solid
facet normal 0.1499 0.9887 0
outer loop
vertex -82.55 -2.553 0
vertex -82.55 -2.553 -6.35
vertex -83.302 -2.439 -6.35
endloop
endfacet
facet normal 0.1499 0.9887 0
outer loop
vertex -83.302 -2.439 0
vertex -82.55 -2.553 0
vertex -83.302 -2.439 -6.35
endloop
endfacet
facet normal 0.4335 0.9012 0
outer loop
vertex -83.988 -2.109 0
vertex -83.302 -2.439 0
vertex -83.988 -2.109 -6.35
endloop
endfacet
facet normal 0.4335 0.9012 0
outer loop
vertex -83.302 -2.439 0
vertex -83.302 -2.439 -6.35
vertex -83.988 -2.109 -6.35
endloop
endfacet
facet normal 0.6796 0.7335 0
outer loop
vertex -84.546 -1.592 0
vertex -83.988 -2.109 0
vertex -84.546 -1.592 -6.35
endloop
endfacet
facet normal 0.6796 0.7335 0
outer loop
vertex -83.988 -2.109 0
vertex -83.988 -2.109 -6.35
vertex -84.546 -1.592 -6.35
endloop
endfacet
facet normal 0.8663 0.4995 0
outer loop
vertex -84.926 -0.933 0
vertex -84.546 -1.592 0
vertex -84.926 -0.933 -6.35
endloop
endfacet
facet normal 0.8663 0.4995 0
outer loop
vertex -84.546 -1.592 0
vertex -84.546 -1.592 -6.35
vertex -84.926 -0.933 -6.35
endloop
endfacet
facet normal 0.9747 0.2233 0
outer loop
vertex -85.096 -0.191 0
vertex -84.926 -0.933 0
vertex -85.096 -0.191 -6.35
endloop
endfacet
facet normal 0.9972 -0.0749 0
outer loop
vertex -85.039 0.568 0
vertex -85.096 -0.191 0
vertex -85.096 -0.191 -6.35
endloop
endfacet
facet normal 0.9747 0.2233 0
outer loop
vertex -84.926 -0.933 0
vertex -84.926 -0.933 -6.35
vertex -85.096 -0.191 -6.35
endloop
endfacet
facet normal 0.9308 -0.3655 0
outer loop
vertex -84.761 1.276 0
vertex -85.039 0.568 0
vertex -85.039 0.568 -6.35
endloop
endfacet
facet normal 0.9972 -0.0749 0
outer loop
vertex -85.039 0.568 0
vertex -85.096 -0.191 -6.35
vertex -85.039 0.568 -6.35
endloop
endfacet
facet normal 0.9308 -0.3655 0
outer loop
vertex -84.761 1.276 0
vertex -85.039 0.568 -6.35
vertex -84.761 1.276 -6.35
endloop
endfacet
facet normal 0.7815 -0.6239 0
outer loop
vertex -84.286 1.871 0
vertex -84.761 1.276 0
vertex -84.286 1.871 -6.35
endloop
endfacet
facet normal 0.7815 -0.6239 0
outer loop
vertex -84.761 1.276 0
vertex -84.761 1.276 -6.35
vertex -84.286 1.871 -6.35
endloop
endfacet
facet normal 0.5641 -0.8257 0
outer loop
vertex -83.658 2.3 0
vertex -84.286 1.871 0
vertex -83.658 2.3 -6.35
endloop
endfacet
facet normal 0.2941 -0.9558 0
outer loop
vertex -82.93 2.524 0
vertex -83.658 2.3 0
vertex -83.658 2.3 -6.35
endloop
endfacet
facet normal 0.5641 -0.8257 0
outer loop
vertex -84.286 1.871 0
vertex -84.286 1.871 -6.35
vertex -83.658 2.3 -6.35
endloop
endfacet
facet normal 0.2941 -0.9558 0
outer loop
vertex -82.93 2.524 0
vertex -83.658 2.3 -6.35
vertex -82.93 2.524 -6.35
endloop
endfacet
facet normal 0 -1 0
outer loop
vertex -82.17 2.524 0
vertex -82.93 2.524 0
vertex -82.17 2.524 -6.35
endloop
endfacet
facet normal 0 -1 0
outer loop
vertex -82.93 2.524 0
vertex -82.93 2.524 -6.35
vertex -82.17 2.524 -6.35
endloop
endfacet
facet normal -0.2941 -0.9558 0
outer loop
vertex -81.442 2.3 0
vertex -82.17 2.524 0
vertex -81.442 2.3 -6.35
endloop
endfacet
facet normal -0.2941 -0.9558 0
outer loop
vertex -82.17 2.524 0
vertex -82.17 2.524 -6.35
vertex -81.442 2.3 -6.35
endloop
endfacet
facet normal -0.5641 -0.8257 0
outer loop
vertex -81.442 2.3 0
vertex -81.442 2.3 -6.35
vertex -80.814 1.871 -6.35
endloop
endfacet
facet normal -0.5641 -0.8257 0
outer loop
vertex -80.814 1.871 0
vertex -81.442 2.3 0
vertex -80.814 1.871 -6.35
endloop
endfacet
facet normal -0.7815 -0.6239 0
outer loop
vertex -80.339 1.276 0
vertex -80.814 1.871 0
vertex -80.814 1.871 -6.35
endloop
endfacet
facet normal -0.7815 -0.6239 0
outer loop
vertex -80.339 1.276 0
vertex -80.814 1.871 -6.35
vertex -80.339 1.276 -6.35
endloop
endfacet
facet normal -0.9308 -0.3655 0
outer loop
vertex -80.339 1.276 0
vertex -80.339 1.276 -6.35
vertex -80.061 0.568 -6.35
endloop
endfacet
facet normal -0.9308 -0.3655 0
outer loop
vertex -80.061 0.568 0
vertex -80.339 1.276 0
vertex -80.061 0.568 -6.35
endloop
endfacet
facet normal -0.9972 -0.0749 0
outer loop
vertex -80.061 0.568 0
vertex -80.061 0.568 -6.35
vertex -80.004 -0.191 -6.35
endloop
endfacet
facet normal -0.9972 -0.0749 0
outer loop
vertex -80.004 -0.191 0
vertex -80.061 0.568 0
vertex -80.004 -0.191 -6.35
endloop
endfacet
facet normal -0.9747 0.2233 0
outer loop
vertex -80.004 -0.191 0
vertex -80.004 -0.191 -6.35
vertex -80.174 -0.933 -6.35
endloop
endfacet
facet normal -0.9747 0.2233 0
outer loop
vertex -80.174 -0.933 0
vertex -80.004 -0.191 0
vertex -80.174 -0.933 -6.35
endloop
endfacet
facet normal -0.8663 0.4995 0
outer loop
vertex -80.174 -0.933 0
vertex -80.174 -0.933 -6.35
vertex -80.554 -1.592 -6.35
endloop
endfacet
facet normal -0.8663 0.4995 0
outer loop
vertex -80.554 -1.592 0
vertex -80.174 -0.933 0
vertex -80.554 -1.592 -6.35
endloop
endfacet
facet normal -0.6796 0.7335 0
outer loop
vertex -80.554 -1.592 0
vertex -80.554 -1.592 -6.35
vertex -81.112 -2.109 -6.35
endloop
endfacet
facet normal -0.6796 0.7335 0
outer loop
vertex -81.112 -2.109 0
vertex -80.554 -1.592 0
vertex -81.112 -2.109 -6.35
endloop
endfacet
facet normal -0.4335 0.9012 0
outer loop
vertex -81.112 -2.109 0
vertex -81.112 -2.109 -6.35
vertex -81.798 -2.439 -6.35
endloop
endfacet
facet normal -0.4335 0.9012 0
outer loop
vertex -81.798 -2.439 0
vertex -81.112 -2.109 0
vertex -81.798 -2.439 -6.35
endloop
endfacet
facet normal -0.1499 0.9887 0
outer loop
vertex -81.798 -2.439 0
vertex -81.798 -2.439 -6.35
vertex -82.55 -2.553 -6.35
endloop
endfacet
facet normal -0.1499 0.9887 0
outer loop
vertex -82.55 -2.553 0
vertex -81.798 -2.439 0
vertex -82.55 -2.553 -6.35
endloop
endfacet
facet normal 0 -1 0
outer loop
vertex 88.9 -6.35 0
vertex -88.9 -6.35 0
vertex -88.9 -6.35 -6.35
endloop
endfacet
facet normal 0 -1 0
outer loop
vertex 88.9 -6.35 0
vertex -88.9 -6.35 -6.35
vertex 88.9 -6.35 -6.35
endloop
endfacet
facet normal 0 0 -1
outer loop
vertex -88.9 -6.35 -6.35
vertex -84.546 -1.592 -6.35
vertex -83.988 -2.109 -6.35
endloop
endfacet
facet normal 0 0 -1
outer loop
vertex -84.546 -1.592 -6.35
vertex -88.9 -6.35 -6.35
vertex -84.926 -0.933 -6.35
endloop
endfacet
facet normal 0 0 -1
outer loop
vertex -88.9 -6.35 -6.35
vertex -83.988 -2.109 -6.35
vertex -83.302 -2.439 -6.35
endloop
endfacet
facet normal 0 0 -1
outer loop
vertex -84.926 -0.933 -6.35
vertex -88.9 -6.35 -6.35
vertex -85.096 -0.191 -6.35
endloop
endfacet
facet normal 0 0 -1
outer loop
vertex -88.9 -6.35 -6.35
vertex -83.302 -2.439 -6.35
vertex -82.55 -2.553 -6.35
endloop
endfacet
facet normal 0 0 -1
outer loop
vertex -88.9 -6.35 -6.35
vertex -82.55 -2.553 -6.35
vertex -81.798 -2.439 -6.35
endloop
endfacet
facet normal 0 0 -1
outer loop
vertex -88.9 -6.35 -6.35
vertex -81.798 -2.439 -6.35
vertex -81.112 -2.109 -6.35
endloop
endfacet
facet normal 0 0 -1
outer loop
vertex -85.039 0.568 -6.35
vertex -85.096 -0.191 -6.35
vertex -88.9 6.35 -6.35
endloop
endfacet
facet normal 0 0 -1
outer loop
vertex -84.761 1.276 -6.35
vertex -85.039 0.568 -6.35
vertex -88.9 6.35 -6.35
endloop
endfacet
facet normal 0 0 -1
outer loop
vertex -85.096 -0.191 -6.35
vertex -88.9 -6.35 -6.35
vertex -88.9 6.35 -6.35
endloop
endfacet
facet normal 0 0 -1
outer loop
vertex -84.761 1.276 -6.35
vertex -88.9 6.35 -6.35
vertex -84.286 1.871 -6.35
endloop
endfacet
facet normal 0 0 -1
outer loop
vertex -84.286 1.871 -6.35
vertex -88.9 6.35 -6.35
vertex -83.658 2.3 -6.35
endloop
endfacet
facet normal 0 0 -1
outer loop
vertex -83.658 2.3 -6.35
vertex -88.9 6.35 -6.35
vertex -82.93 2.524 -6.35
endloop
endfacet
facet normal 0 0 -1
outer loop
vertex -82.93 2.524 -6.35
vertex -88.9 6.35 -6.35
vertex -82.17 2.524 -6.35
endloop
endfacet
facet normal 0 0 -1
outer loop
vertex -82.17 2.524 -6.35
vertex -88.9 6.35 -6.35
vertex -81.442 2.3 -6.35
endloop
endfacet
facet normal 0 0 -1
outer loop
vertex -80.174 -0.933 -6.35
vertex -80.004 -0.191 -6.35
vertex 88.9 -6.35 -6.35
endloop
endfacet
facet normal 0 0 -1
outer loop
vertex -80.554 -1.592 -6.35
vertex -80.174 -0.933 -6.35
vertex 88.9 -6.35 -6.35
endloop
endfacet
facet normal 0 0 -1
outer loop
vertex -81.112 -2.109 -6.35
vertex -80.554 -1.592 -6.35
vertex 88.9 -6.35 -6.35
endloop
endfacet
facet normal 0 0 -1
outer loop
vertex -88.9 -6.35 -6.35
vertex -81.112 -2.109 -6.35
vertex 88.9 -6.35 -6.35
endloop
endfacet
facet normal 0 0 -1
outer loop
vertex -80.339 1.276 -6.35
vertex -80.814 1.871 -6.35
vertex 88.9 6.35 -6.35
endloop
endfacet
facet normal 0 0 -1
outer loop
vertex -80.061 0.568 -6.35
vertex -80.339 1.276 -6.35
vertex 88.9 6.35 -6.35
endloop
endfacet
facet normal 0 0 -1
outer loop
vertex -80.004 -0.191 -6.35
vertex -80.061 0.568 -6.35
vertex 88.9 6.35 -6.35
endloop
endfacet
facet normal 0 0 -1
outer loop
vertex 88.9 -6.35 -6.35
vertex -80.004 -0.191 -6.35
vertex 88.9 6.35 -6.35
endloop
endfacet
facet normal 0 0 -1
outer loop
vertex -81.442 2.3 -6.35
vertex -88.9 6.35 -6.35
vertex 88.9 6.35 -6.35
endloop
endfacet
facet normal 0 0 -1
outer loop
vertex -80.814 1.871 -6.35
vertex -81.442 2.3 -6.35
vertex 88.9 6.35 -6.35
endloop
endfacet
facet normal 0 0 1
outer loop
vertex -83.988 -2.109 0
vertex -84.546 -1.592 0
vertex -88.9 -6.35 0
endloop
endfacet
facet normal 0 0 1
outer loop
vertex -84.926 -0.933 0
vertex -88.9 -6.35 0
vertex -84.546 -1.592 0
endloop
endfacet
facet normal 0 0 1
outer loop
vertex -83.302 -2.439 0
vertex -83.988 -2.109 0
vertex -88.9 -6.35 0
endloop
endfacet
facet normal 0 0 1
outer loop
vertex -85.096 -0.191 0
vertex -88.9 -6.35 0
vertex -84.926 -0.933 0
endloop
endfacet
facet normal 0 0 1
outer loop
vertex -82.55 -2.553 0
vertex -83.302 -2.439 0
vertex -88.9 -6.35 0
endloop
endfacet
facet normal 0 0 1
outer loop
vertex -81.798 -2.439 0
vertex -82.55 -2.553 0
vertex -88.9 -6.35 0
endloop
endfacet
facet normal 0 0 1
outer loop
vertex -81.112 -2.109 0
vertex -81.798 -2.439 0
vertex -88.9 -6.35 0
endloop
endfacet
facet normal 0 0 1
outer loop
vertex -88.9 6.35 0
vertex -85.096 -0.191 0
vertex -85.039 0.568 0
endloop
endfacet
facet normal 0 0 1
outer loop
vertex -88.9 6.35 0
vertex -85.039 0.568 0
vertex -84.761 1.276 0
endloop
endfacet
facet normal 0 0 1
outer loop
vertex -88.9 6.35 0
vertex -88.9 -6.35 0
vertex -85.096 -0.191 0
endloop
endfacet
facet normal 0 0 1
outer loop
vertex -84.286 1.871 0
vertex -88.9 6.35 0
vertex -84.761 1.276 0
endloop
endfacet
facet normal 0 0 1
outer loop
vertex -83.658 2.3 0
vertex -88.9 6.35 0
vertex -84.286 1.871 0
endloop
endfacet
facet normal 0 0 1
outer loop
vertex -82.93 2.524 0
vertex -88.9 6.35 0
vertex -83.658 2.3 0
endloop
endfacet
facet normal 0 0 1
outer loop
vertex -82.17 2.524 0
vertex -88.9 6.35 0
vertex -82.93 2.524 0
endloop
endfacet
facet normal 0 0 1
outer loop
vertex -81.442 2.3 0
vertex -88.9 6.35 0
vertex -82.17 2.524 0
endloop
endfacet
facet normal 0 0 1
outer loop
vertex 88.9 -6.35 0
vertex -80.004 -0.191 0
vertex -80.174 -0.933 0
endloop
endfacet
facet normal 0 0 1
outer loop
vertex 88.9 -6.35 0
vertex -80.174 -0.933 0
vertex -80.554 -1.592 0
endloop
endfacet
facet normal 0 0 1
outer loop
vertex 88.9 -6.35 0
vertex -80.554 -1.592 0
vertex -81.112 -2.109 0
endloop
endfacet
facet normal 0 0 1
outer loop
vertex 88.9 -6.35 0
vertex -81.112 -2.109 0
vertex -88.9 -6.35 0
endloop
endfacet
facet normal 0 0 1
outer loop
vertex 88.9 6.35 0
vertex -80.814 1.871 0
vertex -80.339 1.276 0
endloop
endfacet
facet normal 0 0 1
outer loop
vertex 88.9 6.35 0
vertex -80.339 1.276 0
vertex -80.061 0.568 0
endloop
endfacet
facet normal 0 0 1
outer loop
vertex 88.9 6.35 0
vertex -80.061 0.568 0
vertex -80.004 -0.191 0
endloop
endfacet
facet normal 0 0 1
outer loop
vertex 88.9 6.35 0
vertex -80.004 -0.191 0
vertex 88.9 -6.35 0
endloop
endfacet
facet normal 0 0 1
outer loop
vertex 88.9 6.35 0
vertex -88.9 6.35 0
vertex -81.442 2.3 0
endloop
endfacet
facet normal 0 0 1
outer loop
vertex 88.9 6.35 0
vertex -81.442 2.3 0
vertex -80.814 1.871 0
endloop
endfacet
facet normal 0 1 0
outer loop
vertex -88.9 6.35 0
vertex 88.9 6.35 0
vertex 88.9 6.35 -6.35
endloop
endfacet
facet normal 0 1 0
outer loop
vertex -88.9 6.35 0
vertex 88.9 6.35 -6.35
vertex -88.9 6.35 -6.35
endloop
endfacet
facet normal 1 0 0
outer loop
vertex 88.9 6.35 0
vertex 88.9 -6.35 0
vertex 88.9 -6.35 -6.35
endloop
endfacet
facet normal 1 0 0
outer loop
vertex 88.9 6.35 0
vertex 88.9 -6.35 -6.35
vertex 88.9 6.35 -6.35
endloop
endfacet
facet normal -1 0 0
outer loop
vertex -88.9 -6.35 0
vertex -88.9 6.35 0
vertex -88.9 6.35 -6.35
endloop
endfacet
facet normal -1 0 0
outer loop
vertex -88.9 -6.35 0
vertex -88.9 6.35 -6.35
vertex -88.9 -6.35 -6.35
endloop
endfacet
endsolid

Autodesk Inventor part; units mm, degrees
ref_plane "YZ Plane" through (0, 0, 0) normal (1, 0, 0) x (0, 1, 0)
ref_plane "XZ Plane" through (0, 0, 0) normal (0, 1, 0) x (-1, 0, 0)
ref_plane "XY Plane" through (0, 0, 0) normal (0, 0, 1) x (1, 0, 0)
sketch "Sketch1" plane through (0, 0, 0) normal (0, 0, 1) x (1, 0, 0)
  line L0 (-88.9, -6.35) -> (88.9, -6.35)
  line L1 (88.9, -6.35) -> (88.9, 6.35)
  line L2 (88.9, 6.35) -> (-88.9, 6.35)
  line L3 (-88.9, 6.35) -> (-88.9, -6.35)
  line L4 (-88.9, -6.35) -> (88.9, 6.35) construction
  line L5 (88.9, -6.35) -> (-88.9, 6.35) construction
  point P0 (0, 0)
  point P1 (-82.55, 0)
  dimension "d0" = 177.8
  dimension "d1" = 12.7
  dimension "d2" = 6.35
extrude "Extrusion1" add sketch "Sketch1" against normal blind 6.35
hole "Hole1" at (-82.55, 0, 0) direction (0, 0, -1) diameter 5.1054 end through all clearance for "Flat Head Machine Screw (82)" size "#10" standard "Ansi Unified Screw Threads"
properties part number "CL6-007" material "Aluminum 6061"
